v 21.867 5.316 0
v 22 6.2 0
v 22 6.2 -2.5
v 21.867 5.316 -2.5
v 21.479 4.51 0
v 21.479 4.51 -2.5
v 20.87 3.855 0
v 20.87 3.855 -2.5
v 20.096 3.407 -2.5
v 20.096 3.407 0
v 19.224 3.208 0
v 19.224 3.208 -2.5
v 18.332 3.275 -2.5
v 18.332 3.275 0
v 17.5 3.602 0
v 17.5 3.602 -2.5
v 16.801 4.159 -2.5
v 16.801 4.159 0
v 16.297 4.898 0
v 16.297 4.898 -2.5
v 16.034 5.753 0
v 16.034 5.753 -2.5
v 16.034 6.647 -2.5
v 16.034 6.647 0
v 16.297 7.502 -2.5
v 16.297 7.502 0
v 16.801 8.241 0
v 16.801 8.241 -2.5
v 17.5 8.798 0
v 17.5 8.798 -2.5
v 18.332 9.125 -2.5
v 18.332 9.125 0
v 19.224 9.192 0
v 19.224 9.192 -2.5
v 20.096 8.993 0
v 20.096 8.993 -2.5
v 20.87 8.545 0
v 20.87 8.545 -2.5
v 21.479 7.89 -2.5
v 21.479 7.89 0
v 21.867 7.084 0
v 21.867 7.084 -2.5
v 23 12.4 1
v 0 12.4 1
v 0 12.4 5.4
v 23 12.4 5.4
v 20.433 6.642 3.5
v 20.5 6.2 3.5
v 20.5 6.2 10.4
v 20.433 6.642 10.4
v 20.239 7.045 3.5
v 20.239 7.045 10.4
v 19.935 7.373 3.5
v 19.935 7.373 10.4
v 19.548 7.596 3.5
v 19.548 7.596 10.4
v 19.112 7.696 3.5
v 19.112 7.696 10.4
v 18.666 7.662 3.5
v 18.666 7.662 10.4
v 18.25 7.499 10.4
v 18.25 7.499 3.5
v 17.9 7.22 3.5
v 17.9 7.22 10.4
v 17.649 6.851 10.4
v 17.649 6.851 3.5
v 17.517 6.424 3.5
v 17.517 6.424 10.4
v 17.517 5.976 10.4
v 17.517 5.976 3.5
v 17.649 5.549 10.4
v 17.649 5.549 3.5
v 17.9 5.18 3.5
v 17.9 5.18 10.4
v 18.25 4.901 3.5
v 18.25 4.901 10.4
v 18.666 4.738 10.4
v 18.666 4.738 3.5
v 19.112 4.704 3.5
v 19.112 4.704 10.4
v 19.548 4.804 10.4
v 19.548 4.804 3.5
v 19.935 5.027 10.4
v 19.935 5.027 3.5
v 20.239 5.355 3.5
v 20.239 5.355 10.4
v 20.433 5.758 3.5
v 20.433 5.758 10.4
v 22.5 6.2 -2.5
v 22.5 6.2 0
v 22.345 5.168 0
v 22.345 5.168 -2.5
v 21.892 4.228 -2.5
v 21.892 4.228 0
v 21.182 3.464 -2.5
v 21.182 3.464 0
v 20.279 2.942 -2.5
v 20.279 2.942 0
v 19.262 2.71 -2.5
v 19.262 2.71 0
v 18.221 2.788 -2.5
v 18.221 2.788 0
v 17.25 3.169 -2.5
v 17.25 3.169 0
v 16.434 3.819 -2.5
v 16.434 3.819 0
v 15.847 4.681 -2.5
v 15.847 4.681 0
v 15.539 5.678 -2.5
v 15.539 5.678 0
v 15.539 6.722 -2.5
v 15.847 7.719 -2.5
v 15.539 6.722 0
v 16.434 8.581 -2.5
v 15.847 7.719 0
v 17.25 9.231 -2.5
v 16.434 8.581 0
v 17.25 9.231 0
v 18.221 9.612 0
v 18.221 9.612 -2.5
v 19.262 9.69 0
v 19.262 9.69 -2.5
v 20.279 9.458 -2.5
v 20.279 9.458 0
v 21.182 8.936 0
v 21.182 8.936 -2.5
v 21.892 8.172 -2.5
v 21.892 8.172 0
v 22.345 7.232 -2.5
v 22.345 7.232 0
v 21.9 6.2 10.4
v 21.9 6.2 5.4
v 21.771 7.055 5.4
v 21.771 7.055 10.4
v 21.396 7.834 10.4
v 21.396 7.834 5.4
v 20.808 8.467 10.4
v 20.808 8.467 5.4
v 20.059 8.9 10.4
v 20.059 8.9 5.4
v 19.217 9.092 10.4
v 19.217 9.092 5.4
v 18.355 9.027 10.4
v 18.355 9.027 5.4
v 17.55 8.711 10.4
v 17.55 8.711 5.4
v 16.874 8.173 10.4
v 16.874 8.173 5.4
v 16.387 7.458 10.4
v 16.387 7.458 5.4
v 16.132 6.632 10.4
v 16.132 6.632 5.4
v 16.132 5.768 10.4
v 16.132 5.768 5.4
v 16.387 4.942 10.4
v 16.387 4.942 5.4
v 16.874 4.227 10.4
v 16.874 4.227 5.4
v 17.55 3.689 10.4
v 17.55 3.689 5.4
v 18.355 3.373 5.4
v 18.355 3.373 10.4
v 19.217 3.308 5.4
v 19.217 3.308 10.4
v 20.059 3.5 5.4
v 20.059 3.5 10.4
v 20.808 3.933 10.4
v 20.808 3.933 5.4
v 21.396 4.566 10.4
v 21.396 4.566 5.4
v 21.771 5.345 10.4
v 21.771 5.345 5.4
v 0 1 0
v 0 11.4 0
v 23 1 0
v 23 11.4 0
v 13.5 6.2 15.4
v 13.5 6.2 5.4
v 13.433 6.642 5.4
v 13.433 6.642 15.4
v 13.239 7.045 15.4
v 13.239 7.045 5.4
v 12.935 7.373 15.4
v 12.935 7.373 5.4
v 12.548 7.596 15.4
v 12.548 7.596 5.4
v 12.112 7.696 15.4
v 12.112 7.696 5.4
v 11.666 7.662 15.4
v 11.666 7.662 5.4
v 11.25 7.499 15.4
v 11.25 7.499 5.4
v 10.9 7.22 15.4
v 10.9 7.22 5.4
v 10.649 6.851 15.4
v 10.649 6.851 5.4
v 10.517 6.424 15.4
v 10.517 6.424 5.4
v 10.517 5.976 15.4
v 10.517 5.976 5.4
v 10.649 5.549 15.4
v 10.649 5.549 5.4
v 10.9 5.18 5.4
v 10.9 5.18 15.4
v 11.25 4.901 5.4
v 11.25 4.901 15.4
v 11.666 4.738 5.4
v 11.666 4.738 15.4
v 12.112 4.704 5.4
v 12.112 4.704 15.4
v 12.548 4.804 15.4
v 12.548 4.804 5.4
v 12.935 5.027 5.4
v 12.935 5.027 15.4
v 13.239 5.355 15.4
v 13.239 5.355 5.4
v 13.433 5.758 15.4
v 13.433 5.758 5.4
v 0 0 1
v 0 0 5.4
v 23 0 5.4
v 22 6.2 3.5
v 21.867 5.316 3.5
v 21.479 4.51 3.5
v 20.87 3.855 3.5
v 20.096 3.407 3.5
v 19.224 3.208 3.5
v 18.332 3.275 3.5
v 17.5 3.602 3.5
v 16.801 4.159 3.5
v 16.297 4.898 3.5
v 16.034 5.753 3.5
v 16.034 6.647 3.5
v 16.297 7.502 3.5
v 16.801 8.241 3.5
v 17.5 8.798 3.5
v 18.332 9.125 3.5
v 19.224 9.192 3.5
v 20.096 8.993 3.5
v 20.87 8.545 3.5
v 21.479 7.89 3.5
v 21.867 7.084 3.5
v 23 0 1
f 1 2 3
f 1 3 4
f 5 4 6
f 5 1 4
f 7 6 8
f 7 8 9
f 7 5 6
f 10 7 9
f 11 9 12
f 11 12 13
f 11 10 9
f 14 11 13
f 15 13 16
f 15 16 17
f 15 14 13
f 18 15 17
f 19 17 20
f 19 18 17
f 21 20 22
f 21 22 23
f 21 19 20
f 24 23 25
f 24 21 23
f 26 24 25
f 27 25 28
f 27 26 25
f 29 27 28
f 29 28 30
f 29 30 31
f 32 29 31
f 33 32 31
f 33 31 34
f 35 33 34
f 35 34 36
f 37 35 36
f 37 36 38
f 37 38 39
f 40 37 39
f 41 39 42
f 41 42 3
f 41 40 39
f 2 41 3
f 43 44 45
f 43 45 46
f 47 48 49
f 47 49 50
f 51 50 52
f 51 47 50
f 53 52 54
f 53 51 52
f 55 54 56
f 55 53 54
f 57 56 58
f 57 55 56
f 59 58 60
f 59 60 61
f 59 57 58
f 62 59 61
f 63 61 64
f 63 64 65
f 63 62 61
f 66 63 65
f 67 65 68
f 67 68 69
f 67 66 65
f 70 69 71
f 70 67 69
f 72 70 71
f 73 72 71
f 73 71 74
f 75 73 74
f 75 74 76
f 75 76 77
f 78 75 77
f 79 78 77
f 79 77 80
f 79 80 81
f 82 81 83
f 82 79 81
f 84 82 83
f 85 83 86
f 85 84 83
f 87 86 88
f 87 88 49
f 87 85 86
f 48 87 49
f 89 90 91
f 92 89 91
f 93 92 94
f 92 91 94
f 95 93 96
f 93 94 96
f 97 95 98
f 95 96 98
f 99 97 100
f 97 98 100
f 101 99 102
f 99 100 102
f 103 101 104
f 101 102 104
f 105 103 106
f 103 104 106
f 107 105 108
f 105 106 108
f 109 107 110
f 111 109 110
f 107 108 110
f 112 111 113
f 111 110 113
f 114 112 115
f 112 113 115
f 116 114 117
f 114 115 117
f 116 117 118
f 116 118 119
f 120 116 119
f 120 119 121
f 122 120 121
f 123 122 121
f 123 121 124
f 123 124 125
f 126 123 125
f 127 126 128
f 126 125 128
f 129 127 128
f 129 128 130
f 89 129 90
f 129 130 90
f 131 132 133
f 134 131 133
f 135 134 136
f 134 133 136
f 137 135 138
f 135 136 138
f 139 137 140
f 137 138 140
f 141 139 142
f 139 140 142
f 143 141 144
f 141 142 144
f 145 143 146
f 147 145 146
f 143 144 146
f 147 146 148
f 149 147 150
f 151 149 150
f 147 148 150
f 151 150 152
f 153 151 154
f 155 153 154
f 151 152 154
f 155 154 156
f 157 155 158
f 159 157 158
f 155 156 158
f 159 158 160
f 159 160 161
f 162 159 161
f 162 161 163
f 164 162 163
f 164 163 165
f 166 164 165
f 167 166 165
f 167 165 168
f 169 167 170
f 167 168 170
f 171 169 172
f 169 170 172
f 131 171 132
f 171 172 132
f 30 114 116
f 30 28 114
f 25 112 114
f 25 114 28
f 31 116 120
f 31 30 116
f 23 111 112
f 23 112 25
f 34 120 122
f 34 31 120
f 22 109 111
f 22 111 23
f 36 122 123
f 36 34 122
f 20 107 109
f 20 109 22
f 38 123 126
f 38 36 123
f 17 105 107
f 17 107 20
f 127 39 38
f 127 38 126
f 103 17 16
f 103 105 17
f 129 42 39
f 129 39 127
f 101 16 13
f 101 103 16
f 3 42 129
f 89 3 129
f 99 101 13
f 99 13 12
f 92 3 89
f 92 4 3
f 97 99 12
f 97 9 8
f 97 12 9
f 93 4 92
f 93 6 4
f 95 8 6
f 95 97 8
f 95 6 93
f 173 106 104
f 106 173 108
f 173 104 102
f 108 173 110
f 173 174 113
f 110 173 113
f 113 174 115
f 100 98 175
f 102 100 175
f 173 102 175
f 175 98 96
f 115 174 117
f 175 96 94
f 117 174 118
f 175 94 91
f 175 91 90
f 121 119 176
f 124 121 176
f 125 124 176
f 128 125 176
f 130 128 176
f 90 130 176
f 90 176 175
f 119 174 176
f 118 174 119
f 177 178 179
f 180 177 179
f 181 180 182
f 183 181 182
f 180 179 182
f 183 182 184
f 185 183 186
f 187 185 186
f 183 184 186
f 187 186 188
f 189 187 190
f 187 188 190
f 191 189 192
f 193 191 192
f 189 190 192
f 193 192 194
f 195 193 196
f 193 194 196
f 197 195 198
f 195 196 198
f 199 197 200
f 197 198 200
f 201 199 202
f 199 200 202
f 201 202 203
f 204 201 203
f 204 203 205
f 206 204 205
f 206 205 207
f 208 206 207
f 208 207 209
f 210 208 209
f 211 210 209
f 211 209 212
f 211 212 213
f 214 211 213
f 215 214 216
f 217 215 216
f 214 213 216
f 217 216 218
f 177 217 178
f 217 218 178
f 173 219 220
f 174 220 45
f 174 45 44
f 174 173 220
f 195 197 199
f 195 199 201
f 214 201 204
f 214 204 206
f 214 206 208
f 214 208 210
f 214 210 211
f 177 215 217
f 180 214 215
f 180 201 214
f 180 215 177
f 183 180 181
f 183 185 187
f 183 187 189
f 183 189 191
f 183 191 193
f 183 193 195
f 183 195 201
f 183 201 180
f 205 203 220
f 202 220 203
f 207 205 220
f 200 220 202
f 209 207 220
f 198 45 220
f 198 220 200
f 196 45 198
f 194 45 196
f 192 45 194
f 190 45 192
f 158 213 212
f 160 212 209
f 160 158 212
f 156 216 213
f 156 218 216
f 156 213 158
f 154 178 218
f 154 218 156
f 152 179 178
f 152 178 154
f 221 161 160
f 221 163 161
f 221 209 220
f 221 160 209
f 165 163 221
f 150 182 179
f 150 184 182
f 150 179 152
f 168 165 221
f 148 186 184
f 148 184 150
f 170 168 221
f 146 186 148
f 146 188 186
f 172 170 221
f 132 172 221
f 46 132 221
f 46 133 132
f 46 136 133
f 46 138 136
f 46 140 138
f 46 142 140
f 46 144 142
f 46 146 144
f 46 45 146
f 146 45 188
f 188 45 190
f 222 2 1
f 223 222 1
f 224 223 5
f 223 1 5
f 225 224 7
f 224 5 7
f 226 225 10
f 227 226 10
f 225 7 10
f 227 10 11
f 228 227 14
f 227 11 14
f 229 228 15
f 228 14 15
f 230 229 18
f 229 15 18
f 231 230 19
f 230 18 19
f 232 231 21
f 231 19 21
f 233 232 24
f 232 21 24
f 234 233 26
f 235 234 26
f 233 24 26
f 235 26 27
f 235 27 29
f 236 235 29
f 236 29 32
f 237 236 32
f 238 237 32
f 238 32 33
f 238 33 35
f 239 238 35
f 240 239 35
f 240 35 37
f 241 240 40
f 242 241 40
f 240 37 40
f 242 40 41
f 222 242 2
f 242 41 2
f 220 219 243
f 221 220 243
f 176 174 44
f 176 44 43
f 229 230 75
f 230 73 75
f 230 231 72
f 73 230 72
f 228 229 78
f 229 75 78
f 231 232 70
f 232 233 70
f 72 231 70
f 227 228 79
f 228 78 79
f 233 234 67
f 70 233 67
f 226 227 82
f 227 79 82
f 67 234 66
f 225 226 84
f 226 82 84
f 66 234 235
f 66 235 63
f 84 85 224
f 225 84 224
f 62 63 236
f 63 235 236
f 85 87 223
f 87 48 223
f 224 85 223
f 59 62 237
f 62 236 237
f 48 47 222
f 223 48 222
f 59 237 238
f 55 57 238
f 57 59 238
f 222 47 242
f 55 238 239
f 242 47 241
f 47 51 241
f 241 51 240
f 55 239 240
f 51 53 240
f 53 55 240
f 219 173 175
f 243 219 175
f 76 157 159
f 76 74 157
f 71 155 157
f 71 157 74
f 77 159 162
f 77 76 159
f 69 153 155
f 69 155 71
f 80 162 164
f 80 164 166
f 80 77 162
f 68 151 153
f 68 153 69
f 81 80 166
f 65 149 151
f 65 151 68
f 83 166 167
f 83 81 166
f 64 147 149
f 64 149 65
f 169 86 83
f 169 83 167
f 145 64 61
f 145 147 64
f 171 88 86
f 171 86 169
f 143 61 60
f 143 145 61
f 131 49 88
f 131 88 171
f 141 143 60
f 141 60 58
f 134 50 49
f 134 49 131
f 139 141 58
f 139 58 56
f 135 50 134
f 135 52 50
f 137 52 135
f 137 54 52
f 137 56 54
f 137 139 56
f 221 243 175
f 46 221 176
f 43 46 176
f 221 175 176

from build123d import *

# Parameters (mm, degrees)
F0_W     = 23
F0_H     = 12.4
F0_R     = 1.5
F1_DEPTH = 5.4
F2_SIZE  = 1
F3_R     = 2.9
F3_R_2   = 1.5
F4_DEPTH = 5
F5_R     = 3.5
F5_R_2   = 3
F6_DEPTH = 2.5
F7_DEPTH = 3.5
F8_R     = 1.5
F9_DEPTH = 10


with BuildPart() as f1:
    # F0 (on Top) → F1 (new body)
    with BuildSketch(Plane.XY):
        with Locations((11.5, 6.2)):
            Rectangle(F0_W, F0_H)
        with Locations((19, 6.2)):
            Circle(F0_R, mode=Mode.SUBTRACT)
    extrude(amount=F1_DEPTH)

    # F2
    f2_edges = [f1.edges().sort_by_distance(p)[0] for p in [
        (11.5, 0, 0),
        (11.5, 12.4, 0),
    ]]
    chamfer(f2_edges, length=F2_SIZE)

    # F3 (on face) → F4 (join)
    with BuildSketch(Plane.XY.offset(5.4)):
        with Locations((19, 6.2)):
            Circle(F3_R)
        with Locations((19, 6.2)):
            Circle(F3_R_2, mode=Mode.SUBTRACT)
    extrude(amount=F4_DEPTH)

    # F5 (on face) → F6 (join)
    with BuildSketch(Plane(origin=(0, 0, 0), x_dir=(1, 0, 0), z_dir=(0, 0, -1))):
        with Locations((19, -6.2)):
            Circle(F5_R)
        with Locations((19, -6.2)):
            Circle(F5_R_2, mode=Mode.SUBTRACT)
    extrude(amount=F6_DEPTH)

    # F7 (cut): a face of the model
    f7_faces = [f1.faces().sort_by_distance(p)[0] for p in [
        (16.0848528137, 6.2, 0),
    ]]
    extrude(f7_faces, amount=-F7_DEPTH, mode=Mode.SUBTRACT)

    # F8 (on face) → F9 (join)
    with BuildSketch(Plane.XY.offset(5.4)):
        with Locations((12, 6.2)):
            Circle(F8_R)
    extrude(amount=F9_DEPTH)


solid = f1.part
